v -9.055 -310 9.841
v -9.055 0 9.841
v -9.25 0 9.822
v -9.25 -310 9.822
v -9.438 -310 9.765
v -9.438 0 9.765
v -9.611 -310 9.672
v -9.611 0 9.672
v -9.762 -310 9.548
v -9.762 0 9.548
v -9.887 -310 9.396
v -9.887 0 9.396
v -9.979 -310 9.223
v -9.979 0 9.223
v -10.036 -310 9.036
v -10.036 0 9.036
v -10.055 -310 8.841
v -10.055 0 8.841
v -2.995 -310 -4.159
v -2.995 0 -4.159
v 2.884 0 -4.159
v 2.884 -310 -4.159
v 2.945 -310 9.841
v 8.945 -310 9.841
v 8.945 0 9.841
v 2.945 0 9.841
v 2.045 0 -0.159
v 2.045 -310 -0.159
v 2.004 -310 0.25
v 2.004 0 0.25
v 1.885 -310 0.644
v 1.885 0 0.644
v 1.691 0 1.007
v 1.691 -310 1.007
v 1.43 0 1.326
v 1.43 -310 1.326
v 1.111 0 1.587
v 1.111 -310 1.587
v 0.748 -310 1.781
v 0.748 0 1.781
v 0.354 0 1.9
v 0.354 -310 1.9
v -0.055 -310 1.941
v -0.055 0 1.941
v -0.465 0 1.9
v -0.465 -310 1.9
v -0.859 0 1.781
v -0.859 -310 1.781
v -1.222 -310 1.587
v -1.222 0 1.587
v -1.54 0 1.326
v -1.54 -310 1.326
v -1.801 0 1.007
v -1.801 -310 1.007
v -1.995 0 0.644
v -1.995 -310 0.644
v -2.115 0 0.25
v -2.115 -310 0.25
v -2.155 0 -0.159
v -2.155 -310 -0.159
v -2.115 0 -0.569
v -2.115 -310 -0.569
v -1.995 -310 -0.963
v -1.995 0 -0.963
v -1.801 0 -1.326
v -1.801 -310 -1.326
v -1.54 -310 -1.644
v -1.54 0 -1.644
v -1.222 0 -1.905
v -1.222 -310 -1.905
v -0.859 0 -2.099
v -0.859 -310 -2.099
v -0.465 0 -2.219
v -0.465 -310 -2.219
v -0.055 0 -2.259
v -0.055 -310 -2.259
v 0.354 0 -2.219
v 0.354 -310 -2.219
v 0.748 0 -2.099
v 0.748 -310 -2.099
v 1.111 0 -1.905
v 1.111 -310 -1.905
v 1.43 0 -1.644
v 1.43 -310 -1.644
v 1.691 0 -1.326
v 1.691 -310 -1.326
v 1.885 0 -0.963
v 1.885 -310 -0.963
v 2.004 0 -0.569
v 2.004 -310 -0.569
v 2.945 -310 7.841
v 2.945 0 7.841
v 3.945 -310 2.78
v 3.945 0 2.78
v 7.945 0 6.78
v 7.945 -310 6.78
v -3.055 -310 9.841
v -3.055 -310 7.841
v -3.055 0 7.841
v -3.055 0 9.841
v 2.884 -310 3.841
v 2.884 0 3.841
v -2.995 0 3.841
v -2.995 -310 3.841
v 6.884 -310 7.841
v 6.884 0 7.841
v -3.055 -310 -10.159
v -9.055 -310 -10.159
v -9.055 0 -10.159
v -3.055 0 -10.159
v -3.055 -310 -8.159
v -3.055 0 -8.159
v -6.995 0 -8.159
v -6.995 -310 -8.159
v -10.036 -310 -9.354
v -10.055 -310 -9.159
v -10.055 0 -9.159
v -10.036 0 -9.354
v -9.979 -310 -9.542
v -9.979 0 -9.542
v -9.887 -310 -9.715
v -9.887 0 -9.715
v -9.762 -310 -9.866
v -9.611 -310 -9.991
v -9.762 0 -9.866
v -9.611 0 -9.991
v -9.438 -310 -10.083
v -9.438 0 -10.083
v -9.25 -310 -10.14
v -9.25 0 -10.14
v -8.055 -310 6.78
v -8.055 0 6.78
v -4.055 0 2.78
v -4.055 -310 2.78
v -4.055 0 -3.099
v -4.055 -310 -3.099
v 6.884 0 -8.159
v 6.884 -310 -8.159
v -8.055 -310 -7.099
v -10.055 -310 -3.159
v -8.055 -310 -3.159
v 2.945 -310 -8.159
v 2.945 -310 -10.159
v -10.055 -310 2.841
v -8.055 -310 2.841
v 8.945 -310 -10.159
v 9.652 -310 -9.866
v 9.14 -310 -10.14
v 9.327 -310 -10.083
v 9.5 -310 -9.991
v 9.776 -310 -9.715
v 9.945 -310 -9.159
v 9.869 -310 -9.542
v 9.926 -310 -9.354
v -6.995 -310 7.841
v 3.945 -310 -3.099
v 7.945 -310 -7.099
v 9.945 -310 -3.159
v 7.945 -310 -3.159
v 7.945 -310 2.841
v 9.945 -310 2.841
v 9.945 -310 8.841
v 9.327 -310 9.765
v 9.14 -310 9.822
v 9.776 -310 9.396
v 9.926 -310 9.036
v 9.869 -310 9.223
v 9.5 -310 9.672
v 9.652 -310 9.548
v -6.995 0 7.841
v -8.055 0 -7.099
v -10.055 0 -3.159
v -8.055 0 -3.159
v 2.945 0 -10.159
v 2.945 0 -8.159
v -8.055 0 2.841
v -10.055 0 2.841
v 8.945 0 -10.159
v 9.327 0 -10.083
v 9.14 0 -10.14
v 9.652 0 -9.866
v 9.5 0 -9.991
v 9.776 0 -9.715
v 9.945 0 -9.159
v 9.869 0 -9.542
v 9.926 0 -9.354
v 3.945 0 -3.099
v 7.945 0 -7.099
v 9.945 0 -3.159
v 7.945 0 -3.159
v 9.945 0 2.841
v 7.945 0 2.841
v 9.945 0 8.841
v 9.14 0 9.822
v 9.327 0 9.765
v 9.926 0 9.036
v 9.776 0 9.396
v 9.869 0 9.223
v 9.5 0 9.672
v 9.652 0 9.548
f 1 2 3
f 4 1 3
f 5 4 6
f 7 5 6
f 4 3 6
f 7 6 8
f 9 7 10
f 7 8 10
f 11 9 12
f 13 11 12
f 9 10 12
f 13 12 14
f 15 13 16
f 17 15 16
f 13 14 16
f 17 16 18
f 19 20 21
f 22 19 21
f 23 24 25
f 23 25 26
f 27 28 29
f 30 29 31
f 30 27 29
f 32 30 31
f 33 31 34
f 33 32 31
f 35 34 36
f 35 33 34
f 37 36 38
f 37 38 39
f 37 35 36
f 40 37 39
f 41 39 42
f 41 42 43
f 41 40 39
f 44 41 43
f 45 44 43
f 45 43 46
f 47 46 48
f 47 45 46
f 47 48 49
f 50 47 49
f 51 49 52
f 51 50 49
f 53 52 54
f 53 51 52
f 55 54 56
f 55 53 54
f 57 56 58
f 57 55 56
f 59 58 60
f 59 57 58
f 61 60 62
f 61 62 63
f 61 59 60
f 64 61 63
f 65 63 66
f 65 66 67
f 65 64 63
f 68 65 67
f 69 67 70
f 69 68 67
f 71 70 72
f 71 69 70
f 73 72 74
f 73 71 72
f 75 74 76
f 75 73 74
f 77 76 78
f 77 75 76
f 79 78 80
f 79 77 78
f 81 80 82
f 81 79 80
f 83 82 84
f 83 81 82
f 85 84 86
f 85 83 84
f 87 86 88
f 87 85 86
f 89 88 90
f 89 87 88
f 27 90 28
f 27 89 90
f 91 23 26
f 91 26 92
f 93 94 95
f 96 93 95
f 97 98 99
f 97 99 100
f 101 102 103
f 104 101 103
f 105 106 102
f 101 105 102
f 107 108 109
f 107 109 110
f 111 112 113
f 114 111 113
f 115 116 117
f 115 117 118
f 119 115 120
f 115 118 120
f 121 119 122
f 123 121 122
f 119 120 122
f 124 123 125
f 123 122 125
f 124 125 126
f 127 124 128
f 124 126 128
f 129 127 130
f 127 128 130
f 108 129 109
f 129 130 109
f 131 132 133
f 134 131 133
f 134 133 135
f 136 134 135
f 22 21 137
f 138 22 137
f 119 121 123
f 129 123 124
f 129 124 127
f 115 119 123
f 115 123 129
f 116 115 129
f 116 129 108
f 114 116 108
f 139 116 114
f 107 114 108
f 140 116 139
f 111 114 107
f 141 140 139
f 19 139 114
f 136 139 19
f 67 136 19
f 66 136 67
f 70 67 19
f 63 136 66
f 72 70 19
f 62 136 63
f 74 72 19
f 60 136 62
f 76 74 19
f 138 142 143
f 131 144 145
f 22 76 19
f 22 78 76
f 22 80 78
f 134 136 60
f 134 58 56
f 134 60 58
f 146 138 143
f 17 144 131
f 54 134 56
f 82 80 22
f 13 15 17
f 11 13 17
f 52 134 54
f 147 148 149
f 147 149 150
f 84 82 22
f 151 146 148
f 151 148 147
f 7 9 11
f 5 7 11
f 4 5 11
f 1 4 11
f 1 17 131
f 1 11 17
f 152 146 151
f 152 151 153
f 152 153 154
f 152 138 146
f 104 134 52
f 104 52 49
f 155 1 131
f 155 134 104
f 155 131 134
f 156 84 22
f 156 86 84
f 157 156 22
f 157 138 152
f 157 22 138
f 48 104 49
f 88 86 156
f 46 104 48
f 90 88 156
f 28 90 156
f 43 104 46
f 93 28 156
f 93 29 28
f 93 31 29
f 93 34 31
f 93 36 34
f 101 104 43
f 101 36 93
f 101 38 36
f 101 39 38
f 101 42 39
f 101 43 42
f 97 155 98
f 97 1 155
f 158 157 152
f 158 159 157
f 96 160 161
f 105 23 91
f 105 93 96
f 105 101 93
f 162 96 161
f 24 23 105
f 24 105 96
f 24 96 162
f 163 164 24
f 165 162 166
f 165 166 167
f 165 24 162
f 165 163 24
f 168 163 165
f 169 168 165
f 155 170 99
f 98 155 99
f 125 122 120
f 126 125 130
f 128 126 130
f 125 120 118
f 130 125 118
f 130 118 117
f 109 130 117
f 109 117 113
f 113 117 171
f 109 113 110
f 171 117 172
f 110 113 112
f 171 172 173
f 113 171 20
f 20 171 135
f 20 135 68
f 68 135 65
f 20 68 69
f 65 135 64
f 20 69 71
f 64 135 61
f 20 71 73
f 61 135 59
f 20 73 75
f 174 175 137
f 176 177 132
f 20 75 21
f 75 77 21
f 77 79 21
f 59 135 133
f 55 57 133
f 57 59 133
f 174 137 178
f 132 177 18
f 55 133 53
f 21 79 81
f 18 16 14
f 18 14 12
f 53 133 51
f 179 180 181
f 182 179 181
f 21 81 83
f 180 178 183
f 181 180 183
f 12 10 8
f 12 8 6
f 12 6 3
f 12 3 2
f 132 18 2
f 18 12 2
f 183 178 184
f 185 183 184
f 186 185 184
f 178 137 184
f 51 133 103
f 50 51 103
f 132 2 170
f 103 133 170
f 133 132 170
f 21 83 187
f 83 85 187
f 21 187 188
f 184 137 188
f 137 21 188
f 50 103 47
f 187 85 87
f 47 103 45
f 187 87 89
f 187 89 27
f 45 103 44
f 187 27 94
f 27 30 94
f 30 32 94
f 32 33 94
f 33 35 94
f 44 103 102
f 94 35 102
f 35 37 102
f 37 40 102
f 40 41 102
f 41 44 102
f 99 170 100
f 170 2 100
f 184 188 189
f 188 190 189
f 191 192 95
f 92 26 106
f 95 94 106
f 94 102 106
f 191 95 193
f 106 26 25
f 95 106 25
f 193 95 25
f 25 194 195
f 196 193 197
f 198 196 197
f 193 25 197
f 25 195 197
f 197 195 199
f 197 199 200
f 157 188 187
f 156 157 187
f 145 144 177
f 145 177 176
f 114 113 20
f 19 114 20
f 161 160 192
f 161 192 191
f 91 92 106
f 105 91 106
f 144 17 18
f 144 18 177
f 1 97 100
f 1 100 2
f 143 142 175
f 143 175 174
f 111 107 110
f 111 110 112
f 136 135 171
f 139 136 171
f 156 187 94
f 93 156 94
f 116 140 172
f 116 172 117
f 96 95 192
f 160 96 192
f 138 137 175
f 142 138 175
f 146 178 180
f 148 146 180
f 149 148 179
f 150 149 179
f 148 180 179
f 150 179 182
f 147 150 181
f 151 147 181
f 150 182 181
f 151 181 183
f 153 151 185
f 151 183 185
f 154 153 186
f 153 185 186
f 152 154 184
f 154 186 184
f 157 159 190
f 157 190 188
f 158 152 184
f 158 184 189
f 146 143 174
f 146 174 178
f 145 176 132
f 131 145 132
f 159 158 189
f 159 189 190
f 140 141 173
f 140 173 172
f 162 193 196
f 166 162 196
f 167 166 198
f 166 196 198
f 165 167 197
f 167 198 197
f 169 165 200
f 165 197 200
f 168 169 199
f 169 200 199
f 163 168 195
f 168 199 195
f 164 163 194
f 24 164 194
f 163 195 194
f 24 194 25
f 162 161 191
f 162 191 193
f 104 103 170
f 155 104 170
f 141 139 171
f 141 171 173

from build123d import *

# Parameters (mm, degrees)
F0_R     = 2.1
F1_DEPTH = 310


with BuildPart() as f1:
    # F0 (on Front) → F1 (new body)
    with BuildSketch(Plane.XZ):
        with BuildLine():
            ThreePointArc((9.944745, 8.840758), (9.651851, 9.547865), (8.944745, 9.840758))
            Line((8.944745, 9.840758), (2.944745, 9.840758))
            Line((2.944745, 9.840758), (2.944745, 7.840758))
            Line((2.944745, 7.840758), (6.884085, 7.840758))
            Line((6.884085, 7.840758), (2.884085, 3.840758))
            Line((2.884085, 3.840758), (-2.994595, 3.840758))
            Line((-2.994595, 3.840758), (-6.994595, 7.840758))
            Line((-6.994595, 7.840758), (-3.055255, 7.840758))
            Line((-3.055255, 7.840758), (-3.055255, 9.840758))
            Line((-3.055255, 9.840758), (-9.055255, 9.840758))
            ThreePointArc((-9.055255, 9.840758), (-9.762362, 9.547865), (-10.055255, 8.840758))
            Line((-10.055255, 8.840758), (-10.055255, 2.840758))
            Line((-10.055255, 2.840758), (-8.055255, 2.840758))
            Line((-8.055255, 2.840758), (-8.055255, 6.780098))
            Line((-8.055255, 6.780098), (-4.055255, 2.780098))
            Line((-4.055255, 2.780098), (-4.055255, -3.098581))
            Line((-4.055255, -3.098581), (-8.055255, -7.098581))
            Line((-8.055255, -7.098581), (-8.055255, -3.159242))
            Line((-8.055255, -3.159242), (-10.055255, -3.159242))
            Line((-10.055255, -3.159242), (-10.055255, -9.159242))
            ThreePointArc((-10.055255, -9.159242), (-9.762362, -9.866348), (-9.055255, -10.159242))
            Line((-9.055255, -10.159242), (-3.055255, -10.159242))
            Line((-3.055255, -10.159242), (-3.055255, -8.159242))
            Line((-3.055255, -8.159242), (-6.994595, -8.159242))
            Line((-6.994595, -8.159242), (-2.994595, -4.159242))
            Line((-2.994595, -4.159242), (2.884085, -4.159242))
            Line((2.884085, -4.159242), (6.884085, -8.159242))
            Line((6.884085, -8.159242), (2.944745, -8.159242))
            Line((2.944745, -8.159242), (2.944745, -10.159242))
            Line((2.944745, -10.159242), (8.944745, -10.159242))
            ThreePointArc((8.944745, -10.159242), (9.651851, -9.866348), (9.944745, -9.159242))
            Line((9.944745, -9.159242), (9.944745, -3.159242))
            Line((9.944745, -3.159242), (7.944745, -3.159242))
            Line((7.944745, -3.159242), (7.944745, -7.098581))
            Line((7.944745, -7.098581), (3.944745, -3.098581))
            Line((3.944745, -3.098581), (3.944745, 2.780098))
            Line((3.944745, 2.780098), (7.944745, 6.780098))
            Line((7.944745, 6.780098), (7.944745, 2.840758))
            Line((7.944745, 2.840758), (9.944745, 2.840758))
            Line((9.944745, 2.840758), (9.944745, 8.840758))
        make_face()
        with Locations((-0.055255, -0.159242)):
            Circle(F0_R, mode=Mode.SUBTRACT)
    extrude(amount=F1_DEPTH)


solid = f1.part
